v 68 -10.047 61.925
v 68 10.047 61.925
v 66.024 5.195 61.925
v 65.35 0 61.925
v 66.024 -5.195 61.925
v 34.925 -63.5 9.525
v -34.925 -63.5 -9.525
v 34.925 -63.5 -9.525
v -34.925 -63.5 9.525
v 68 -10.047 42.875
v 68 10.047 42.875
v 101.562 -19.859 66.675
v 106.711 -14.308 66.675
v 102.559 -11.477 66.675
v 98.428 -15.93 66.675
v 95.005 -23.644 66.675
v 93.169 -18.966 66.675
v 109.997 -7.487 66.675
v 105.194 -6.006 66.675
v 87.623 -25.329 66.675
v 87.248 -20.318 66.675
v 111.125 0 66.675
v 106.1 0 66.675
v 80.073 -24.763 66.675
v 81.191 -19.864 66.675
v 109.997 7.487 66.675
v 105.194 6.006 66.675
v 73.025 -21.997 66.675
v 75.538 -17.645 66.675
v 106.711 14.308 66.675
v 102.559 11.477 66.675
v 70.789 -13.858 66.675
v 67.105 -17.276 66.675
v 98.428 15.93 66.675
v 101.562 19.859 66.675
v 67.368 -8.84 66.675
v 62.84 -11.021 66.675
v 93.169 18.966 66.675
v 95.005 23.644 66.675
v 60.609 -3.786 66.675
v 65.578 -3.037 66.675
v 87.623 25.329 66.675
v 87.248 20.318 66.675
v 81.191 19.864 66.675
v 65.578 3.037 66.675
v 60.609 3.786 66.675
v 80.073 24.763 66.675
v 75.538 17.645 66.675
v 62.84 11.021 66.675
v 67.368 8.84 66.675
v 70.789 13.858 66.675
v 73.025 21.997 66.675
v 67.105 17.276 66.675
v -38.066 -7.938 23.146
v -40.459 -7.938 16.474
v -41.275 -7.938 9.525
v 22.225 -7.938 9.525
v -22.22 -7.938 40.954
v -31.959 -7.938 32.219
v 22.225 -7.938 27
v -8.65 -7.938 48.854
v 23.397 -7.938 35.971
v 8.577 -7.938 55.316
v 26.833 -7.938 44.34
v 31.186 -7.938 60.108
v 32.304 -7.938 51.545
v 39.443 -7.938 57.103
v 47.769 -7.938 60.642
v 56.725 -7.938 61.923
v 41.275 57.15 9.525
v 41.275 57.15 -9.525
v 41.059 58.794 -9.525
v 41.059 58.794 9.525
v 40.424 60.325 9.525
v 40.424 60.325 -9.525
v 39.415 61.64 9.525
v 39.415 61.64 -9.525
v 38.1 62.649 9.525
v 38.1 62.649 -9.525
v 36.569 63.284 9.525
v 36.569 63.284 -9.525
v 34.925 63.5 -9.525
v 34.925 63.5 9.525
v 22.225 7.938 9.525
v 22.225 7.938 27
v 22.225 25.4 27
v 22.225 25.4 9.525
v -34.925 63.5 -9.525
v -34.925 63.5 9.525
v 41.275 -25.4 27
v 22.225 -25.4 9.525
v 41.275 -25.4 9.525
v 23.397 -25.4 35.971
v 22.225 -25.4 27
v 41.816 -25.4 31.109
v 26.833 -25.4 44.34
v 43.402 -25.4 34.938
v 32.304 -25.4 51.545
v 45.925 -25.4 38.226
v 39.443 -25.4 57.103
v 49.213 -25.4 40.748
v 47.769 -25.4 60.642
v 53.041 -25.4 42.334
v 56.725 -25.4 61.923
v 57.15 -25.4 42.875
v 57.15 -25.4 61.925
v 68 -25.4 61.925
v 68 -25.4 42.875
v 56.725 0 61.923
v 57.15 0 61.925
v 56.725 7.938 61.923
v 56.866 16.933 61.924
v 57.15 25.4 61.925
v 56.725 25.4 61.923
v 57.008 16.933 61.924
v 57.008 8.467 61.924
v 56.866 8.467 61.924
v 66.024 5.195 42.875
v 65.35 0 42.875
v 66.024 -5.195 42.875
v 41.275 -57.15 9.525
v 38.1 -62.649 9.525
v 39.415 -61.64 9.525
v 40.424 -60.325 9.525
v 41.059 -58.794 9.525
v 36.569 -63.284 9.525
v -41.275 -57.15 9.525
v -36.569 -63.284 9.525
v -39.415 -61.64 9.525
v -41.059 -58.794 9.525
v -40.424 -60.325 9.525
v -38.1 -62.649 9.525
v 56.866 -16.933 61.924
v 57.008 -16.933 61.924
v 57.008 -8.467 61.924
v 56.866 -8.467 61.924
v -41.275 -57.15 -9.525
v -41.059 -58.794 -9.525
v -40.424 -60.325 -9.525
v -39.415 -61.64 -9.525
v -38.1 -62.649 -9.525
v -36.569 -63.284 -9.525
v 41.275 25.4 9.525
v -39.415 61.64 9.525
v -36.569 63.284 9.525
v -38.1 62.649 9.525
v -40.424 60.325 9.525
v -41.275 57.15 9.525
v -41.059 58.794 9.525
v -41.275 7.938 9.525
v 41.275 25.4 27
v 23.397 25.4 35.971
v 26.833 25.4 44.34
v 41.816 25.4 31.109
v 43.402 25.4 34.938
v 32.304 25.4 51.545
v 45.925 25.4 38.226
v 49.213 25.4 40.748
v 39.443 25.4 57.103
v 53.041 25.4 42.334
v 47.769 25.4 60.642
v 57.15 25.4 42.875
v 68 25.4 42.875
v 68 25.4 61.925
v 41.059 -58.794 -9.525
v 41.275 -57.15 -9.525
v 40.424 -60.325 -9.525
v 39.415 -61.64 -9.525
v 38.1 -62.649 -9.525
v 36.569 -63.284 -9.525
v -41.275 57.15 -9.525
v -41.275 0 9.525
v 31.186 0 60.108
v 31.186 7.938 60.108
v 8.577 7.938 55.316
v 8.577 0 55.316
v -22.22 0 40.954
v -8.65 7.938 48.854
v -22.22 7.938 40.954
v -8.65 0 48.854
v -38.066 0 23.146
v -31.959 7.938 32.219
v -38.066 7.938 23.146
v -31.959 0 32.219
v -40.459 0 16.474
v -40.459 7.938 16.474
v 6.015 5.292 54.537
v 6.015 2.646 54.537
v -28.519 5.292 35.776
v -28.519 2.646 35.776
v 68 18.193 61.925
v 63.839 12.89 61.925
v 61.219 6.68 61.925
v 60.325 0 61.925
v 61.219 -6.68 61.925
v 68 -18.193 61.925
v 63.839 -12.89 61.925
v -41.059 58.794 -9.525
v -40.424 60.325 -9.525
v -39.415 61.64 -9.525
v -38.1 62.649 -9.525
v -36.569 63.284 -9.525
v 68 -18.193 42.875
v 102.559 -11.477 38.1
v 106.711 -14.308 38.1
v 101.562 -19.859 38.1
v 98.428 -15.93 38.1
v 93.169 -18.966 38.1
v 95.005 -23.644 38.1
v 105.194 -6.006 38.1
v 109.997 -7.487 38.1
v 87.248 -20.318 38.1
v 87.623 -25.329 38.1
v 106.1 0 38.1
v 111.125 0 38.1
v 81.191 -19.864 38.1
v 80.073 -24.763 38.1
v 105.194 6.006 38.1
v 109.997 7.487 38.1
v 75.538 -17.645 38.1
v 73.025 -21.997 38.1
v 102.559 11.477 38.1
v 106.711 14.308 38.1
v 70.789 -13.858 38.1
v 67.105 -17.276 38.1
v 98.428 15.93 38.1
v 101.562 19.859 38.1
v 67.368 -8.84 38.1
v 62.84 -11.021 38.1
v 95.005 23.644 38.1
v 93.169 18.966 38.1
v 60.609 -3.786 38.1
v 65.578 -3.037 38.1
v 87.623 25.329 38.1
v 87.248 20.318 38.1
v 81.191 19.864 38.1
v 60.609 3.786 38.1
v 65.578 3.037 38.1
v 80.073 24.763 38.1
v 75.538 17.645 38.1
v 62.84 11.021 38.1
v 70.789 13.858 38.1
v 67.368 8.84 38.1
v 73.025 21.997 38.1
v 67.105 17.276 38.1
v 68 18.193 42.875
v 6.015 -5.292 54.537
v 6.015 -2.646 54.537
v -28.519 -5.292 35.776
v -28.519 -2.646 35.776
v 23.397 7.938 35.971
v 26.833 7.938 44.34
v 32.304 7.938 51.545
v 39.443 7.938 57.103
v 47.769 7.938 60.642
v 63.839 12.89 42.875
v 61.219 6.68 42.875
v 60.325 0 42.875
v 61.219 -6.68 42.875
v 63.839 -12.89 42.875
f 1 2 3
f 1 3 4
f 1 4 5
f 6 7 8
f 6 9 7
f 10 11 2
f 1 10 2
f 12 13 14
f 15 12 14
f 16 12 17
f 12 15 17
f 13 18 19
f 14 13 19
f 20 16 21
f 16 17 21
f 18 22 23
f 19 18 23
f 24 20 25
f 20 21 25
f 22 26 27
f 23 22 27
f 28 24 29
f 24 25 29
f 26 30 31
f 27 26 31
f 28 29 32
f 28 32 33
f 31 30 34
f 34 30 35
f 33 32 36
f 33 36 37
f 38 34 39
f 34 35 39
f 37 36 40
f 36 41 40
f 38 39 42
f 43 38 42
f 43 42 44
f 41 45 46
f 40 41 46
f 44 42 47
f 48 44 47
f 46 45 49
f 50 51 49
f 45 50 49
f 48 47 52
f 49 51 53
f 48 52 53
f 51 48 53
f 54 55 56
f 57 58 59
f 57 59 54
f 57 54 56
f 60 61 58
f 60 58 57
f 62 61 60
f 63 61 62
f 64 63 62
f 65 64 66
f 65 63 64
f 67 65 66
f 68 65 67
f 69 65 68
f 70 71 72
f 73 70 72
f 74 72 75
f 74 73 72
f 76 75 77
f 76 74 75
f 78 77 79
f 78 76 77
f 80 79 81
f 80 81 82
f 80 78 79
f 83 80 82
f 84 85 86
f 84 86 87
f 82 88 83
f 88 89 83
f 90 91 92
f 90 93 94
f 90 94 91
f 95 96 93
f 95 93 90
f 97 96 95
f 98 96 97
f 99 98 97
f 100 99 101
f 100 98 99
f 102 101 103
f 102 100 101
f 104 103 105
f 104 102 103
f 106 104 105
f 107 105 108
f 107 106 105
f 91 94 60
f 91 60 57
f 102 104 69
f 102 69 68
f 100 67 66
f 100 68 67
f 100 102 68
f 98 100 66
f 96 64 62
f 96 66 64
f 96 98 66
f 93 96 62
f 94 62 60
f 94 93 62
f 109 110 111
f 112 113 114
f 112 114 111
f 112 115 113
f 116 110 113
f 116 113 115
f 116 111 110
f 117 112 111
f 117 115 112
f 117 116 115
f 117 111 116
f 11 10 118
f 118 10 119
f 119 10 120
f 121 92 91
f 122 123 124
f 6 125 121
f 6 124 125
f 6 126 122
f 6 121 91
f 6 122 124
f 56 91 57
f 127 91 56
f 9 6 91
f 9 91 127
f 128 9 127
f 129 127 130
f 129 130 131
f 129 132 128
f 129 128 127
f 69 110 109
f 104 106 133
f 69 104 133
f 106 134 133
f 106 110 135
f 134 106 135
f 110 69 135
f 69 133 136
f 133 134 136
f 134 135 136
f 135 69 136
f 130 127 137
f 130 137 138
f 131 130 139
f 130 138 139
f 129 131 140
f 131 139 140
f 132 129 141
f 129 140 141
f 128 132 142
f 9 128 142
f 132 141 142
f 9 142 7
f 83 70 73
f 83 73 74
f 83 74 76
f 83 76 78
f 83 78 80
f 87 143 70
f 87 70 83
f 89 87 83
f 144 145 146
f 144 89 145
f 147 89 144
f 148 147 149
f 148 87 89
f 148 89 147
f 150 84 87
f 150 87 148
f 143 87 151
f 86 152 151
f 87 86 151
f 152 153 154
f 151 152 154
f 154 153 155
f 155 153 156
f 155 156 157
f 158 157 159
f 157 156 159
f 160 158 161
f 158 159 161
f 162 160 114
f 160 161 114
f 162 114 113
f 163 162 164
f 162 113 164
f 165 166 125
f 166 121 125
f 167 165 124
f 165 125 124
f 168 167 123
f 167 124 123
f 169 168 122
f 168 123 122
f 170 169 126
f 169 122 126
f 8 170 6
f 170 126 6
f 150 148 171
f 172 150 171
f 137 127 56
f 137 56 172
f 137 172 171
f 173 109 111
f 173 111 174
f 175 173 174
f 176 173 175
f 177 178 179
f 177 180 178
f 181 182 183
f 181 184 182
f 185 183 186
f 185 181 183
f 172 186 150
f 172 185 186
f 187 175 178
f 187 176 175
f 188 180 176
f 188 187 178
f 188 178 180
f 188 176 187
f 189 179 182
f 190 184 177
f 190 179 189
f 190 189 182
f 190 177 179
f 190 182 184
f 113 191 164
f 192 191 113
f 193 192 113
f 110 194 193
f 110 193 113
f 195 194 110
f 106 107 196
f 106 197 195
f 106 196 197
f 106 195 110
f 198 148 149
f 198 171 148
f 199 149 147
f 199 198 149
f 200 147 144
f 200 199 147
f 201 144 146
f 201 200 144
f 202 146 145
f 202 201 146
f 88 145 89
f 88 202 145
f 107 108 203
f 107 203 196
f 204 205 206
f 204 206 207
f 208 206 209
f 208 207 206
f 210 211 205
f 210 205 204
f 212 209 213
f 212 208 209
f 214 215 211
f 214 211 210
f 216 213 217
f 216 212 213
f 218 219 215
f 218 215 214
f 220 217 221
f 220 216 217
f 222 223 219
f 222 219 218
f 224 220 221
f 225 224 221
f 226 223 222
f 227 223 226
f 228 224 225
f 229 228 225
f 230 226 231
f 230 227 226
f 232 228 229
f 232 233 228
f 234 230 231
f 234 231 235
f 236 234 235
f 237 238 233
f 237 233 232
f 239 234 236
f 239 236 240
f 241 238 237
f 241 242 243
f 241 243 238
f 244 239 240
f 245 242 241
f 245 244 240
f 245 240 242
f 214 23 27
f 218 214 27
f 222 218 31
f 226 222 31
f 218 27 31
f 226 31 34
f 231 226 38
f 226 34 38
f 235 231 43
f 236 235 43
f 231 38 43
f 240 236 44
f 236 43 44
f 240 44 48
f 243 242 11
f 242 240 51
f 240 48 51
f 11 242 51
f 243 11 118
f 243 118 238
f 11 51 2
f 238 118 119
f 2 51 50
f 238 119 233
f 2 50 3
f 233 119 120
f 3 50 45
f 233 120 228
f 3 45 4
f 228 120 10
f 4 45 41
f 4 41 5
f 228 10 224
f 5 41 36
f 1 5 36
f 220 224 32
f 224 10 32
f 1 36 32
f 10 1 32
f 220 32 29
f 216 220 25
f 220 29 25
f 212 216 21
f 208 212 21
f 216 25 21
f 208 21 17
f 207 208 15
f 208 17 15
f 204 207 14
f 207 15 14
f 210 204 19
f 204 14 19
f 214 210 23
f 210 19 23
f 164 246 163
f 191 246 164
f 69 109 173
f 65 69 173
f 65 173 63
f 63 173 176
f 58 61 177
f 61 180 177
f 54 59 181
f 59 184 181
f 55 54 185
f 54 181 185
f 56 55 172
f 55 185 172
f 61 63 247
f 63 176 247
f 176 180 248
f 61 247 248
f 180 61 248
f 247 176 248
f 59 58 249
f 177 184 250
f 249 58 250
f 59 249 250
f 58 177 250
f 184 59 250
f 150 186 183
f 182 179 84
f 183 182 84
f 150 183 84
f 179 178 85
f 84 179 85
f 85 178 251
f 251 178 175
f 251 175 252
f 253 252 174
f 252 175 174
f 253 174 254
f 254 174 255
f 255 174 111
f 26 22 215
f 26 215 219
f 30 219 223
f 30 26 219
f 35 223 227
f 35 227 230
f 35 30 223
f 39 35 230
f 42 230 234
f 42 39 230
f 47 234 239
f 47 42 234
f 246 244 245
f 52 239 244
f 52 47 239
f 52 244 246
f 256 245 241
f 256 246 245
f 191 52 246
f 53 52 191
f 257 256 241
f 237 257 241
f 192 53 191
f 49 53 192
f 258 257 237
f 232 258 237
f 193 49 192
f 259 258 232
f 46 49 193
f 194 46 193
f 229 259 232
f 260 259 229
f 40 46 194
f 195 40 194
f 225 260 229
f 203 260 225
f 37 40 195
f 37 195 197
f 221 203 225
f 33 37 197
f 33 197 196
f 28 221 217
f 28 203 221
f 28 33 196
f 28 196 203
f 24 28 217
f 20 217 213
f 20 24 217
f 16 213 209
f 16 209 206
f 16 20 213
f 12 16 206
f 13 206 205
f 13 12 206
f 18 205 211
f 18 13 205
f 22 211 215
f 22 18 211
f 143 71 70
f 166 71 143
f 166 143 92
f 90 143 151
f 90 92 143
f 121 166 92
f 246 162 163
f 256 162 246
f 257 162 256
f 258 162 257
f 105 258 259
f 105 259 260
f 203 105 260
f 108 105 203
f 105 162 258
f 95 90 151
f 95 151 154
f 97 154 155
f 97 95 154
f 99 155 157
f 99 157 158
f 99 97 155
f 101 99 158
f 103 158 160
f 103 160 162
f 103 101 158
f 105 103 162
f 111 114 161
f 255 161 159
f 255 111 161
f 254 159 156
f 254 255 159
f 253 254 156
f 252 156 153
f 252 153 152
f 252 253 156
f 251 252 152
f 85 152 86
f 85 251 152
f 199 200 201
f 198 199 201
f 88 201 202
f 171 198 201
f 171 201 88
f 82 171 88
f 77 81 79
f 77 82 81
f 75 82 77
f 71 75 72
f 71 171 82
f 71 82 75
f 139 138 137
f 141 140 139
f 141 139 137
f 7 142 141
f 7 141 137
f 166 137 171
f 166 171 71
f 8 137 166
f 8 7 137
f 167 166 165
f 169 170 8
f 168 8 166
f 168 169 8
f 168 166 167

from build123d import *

# Parameters (mm, degrees)
F1_DEPTH = 63.5
F0_W     = 7.6746088147
F0_H     = 19.05
F2_DEPTH = 25.4
F3_DEPTH = 7.9375
F0_W_2   = 5.0253911853
F0_H_2   = 28.575
F5_R     = 6.35


with BuildPart() as f1:
    # F0 (on Front) → F1 (new body, symmetric)
    with BuildSketch(Plane.XZ):
        Polygon((-41.275, -9.525), (41.275, -9.525), (41.275, 9.525), (22.225, 9.525), (-41.275, 9.525), align=None)
    extrude(amount=F1_DEPTH, both=True)

    # F0 (on Front) → F2 (join, symmetric)
    with BuildSketch(Plane.XZ):
        with BuildLine():
            Line((22.225, 9.525), (41.275, 9.525))
            Line((41.275, 9.525), (41.275, 27.0002))
            ThreePointArc((41.275, 27.0002), (45.9246798487, 38.2255201513), (57.15, 42.8752))
            Line((57.15, 42.8752), (60.325, 42.8752))
            Line((60.325, 42.8752), (60.325, 61.9252))
            Line((60.325, 61.9252), (57.15, 61.9252))
            add(Edge.make_bspline(
                [(57.15, 61.9252), (57.0081649495, 61.9244790011), (56.8664276787, 61.9236160554), (56.7247885758, 61.9226114323)],
                knots=[0, 0, 0, 0, 0.27673231, 0.27673231, 0.27673231, 0.27673231], degree=3))
            ThreePointArc((56.7247885758, 61.9226114323), (32.3044155433, 51.5451090038), (22.225, 27.0002))
            Line((22.225, 27.0002), (22.225, 9.525))
        make_face()
        with Locations((64.1623044074, 52.4002)):
            Rectangle(F0_W, F0_H)
    extrude(amount=F2_DEPTH, both=True)

    # F0 (on Front) → F3 (join, symmetric)
    with BuildSketch(Plane.XZ):
        with BuildLine():
            add(Edge.make_bspline(
                [(56.7247885758, 61.9226114323), (-0.2046186236, 61.5188203951), (-41.275, 38.2270255061), (-41.275, 9.525)],
                knots=[0.27673231, 0.27673231, 0.27673231, 0.27673231, 111.5045361635, 111.5045361635, 111.5045361635, 111.5045361635], degree=3))
            Line((-41.275, 9.525), (22.225, 9.525))
            Line((22.225, 9.525), (22.225, 27.0002))
            ThreePointArc((22.225, 27.0002), (32.3044155433, 51.5451090038), (56.7247885758, 61.9226114323))
        make_face()
    extrude(amount=F3_DEPTH, both=True)

    # F0 (on Front) → F4 (revolve)
    with BuildSketch(Plane.XZ):
        with Locations((108.6123044074, 52.3875)):
            Rectangle(F0_W_2, F0_H_2)
    revolve(axis=Axis((85.725, 0, 52.3875), (0, 0, 1)))

    # F5
    f5_edges = [f1.edges().sort_by_distance(p)[0] for p in [
        (41.275, -63.5, 0),
        (-41.275, -63.5, 0),
        (41.275, 63.5, 0),
        (-41.275, 63.5, 0),
    ]]
    fillet(f5_edges, radius=F5_R)


solid = f1.part
